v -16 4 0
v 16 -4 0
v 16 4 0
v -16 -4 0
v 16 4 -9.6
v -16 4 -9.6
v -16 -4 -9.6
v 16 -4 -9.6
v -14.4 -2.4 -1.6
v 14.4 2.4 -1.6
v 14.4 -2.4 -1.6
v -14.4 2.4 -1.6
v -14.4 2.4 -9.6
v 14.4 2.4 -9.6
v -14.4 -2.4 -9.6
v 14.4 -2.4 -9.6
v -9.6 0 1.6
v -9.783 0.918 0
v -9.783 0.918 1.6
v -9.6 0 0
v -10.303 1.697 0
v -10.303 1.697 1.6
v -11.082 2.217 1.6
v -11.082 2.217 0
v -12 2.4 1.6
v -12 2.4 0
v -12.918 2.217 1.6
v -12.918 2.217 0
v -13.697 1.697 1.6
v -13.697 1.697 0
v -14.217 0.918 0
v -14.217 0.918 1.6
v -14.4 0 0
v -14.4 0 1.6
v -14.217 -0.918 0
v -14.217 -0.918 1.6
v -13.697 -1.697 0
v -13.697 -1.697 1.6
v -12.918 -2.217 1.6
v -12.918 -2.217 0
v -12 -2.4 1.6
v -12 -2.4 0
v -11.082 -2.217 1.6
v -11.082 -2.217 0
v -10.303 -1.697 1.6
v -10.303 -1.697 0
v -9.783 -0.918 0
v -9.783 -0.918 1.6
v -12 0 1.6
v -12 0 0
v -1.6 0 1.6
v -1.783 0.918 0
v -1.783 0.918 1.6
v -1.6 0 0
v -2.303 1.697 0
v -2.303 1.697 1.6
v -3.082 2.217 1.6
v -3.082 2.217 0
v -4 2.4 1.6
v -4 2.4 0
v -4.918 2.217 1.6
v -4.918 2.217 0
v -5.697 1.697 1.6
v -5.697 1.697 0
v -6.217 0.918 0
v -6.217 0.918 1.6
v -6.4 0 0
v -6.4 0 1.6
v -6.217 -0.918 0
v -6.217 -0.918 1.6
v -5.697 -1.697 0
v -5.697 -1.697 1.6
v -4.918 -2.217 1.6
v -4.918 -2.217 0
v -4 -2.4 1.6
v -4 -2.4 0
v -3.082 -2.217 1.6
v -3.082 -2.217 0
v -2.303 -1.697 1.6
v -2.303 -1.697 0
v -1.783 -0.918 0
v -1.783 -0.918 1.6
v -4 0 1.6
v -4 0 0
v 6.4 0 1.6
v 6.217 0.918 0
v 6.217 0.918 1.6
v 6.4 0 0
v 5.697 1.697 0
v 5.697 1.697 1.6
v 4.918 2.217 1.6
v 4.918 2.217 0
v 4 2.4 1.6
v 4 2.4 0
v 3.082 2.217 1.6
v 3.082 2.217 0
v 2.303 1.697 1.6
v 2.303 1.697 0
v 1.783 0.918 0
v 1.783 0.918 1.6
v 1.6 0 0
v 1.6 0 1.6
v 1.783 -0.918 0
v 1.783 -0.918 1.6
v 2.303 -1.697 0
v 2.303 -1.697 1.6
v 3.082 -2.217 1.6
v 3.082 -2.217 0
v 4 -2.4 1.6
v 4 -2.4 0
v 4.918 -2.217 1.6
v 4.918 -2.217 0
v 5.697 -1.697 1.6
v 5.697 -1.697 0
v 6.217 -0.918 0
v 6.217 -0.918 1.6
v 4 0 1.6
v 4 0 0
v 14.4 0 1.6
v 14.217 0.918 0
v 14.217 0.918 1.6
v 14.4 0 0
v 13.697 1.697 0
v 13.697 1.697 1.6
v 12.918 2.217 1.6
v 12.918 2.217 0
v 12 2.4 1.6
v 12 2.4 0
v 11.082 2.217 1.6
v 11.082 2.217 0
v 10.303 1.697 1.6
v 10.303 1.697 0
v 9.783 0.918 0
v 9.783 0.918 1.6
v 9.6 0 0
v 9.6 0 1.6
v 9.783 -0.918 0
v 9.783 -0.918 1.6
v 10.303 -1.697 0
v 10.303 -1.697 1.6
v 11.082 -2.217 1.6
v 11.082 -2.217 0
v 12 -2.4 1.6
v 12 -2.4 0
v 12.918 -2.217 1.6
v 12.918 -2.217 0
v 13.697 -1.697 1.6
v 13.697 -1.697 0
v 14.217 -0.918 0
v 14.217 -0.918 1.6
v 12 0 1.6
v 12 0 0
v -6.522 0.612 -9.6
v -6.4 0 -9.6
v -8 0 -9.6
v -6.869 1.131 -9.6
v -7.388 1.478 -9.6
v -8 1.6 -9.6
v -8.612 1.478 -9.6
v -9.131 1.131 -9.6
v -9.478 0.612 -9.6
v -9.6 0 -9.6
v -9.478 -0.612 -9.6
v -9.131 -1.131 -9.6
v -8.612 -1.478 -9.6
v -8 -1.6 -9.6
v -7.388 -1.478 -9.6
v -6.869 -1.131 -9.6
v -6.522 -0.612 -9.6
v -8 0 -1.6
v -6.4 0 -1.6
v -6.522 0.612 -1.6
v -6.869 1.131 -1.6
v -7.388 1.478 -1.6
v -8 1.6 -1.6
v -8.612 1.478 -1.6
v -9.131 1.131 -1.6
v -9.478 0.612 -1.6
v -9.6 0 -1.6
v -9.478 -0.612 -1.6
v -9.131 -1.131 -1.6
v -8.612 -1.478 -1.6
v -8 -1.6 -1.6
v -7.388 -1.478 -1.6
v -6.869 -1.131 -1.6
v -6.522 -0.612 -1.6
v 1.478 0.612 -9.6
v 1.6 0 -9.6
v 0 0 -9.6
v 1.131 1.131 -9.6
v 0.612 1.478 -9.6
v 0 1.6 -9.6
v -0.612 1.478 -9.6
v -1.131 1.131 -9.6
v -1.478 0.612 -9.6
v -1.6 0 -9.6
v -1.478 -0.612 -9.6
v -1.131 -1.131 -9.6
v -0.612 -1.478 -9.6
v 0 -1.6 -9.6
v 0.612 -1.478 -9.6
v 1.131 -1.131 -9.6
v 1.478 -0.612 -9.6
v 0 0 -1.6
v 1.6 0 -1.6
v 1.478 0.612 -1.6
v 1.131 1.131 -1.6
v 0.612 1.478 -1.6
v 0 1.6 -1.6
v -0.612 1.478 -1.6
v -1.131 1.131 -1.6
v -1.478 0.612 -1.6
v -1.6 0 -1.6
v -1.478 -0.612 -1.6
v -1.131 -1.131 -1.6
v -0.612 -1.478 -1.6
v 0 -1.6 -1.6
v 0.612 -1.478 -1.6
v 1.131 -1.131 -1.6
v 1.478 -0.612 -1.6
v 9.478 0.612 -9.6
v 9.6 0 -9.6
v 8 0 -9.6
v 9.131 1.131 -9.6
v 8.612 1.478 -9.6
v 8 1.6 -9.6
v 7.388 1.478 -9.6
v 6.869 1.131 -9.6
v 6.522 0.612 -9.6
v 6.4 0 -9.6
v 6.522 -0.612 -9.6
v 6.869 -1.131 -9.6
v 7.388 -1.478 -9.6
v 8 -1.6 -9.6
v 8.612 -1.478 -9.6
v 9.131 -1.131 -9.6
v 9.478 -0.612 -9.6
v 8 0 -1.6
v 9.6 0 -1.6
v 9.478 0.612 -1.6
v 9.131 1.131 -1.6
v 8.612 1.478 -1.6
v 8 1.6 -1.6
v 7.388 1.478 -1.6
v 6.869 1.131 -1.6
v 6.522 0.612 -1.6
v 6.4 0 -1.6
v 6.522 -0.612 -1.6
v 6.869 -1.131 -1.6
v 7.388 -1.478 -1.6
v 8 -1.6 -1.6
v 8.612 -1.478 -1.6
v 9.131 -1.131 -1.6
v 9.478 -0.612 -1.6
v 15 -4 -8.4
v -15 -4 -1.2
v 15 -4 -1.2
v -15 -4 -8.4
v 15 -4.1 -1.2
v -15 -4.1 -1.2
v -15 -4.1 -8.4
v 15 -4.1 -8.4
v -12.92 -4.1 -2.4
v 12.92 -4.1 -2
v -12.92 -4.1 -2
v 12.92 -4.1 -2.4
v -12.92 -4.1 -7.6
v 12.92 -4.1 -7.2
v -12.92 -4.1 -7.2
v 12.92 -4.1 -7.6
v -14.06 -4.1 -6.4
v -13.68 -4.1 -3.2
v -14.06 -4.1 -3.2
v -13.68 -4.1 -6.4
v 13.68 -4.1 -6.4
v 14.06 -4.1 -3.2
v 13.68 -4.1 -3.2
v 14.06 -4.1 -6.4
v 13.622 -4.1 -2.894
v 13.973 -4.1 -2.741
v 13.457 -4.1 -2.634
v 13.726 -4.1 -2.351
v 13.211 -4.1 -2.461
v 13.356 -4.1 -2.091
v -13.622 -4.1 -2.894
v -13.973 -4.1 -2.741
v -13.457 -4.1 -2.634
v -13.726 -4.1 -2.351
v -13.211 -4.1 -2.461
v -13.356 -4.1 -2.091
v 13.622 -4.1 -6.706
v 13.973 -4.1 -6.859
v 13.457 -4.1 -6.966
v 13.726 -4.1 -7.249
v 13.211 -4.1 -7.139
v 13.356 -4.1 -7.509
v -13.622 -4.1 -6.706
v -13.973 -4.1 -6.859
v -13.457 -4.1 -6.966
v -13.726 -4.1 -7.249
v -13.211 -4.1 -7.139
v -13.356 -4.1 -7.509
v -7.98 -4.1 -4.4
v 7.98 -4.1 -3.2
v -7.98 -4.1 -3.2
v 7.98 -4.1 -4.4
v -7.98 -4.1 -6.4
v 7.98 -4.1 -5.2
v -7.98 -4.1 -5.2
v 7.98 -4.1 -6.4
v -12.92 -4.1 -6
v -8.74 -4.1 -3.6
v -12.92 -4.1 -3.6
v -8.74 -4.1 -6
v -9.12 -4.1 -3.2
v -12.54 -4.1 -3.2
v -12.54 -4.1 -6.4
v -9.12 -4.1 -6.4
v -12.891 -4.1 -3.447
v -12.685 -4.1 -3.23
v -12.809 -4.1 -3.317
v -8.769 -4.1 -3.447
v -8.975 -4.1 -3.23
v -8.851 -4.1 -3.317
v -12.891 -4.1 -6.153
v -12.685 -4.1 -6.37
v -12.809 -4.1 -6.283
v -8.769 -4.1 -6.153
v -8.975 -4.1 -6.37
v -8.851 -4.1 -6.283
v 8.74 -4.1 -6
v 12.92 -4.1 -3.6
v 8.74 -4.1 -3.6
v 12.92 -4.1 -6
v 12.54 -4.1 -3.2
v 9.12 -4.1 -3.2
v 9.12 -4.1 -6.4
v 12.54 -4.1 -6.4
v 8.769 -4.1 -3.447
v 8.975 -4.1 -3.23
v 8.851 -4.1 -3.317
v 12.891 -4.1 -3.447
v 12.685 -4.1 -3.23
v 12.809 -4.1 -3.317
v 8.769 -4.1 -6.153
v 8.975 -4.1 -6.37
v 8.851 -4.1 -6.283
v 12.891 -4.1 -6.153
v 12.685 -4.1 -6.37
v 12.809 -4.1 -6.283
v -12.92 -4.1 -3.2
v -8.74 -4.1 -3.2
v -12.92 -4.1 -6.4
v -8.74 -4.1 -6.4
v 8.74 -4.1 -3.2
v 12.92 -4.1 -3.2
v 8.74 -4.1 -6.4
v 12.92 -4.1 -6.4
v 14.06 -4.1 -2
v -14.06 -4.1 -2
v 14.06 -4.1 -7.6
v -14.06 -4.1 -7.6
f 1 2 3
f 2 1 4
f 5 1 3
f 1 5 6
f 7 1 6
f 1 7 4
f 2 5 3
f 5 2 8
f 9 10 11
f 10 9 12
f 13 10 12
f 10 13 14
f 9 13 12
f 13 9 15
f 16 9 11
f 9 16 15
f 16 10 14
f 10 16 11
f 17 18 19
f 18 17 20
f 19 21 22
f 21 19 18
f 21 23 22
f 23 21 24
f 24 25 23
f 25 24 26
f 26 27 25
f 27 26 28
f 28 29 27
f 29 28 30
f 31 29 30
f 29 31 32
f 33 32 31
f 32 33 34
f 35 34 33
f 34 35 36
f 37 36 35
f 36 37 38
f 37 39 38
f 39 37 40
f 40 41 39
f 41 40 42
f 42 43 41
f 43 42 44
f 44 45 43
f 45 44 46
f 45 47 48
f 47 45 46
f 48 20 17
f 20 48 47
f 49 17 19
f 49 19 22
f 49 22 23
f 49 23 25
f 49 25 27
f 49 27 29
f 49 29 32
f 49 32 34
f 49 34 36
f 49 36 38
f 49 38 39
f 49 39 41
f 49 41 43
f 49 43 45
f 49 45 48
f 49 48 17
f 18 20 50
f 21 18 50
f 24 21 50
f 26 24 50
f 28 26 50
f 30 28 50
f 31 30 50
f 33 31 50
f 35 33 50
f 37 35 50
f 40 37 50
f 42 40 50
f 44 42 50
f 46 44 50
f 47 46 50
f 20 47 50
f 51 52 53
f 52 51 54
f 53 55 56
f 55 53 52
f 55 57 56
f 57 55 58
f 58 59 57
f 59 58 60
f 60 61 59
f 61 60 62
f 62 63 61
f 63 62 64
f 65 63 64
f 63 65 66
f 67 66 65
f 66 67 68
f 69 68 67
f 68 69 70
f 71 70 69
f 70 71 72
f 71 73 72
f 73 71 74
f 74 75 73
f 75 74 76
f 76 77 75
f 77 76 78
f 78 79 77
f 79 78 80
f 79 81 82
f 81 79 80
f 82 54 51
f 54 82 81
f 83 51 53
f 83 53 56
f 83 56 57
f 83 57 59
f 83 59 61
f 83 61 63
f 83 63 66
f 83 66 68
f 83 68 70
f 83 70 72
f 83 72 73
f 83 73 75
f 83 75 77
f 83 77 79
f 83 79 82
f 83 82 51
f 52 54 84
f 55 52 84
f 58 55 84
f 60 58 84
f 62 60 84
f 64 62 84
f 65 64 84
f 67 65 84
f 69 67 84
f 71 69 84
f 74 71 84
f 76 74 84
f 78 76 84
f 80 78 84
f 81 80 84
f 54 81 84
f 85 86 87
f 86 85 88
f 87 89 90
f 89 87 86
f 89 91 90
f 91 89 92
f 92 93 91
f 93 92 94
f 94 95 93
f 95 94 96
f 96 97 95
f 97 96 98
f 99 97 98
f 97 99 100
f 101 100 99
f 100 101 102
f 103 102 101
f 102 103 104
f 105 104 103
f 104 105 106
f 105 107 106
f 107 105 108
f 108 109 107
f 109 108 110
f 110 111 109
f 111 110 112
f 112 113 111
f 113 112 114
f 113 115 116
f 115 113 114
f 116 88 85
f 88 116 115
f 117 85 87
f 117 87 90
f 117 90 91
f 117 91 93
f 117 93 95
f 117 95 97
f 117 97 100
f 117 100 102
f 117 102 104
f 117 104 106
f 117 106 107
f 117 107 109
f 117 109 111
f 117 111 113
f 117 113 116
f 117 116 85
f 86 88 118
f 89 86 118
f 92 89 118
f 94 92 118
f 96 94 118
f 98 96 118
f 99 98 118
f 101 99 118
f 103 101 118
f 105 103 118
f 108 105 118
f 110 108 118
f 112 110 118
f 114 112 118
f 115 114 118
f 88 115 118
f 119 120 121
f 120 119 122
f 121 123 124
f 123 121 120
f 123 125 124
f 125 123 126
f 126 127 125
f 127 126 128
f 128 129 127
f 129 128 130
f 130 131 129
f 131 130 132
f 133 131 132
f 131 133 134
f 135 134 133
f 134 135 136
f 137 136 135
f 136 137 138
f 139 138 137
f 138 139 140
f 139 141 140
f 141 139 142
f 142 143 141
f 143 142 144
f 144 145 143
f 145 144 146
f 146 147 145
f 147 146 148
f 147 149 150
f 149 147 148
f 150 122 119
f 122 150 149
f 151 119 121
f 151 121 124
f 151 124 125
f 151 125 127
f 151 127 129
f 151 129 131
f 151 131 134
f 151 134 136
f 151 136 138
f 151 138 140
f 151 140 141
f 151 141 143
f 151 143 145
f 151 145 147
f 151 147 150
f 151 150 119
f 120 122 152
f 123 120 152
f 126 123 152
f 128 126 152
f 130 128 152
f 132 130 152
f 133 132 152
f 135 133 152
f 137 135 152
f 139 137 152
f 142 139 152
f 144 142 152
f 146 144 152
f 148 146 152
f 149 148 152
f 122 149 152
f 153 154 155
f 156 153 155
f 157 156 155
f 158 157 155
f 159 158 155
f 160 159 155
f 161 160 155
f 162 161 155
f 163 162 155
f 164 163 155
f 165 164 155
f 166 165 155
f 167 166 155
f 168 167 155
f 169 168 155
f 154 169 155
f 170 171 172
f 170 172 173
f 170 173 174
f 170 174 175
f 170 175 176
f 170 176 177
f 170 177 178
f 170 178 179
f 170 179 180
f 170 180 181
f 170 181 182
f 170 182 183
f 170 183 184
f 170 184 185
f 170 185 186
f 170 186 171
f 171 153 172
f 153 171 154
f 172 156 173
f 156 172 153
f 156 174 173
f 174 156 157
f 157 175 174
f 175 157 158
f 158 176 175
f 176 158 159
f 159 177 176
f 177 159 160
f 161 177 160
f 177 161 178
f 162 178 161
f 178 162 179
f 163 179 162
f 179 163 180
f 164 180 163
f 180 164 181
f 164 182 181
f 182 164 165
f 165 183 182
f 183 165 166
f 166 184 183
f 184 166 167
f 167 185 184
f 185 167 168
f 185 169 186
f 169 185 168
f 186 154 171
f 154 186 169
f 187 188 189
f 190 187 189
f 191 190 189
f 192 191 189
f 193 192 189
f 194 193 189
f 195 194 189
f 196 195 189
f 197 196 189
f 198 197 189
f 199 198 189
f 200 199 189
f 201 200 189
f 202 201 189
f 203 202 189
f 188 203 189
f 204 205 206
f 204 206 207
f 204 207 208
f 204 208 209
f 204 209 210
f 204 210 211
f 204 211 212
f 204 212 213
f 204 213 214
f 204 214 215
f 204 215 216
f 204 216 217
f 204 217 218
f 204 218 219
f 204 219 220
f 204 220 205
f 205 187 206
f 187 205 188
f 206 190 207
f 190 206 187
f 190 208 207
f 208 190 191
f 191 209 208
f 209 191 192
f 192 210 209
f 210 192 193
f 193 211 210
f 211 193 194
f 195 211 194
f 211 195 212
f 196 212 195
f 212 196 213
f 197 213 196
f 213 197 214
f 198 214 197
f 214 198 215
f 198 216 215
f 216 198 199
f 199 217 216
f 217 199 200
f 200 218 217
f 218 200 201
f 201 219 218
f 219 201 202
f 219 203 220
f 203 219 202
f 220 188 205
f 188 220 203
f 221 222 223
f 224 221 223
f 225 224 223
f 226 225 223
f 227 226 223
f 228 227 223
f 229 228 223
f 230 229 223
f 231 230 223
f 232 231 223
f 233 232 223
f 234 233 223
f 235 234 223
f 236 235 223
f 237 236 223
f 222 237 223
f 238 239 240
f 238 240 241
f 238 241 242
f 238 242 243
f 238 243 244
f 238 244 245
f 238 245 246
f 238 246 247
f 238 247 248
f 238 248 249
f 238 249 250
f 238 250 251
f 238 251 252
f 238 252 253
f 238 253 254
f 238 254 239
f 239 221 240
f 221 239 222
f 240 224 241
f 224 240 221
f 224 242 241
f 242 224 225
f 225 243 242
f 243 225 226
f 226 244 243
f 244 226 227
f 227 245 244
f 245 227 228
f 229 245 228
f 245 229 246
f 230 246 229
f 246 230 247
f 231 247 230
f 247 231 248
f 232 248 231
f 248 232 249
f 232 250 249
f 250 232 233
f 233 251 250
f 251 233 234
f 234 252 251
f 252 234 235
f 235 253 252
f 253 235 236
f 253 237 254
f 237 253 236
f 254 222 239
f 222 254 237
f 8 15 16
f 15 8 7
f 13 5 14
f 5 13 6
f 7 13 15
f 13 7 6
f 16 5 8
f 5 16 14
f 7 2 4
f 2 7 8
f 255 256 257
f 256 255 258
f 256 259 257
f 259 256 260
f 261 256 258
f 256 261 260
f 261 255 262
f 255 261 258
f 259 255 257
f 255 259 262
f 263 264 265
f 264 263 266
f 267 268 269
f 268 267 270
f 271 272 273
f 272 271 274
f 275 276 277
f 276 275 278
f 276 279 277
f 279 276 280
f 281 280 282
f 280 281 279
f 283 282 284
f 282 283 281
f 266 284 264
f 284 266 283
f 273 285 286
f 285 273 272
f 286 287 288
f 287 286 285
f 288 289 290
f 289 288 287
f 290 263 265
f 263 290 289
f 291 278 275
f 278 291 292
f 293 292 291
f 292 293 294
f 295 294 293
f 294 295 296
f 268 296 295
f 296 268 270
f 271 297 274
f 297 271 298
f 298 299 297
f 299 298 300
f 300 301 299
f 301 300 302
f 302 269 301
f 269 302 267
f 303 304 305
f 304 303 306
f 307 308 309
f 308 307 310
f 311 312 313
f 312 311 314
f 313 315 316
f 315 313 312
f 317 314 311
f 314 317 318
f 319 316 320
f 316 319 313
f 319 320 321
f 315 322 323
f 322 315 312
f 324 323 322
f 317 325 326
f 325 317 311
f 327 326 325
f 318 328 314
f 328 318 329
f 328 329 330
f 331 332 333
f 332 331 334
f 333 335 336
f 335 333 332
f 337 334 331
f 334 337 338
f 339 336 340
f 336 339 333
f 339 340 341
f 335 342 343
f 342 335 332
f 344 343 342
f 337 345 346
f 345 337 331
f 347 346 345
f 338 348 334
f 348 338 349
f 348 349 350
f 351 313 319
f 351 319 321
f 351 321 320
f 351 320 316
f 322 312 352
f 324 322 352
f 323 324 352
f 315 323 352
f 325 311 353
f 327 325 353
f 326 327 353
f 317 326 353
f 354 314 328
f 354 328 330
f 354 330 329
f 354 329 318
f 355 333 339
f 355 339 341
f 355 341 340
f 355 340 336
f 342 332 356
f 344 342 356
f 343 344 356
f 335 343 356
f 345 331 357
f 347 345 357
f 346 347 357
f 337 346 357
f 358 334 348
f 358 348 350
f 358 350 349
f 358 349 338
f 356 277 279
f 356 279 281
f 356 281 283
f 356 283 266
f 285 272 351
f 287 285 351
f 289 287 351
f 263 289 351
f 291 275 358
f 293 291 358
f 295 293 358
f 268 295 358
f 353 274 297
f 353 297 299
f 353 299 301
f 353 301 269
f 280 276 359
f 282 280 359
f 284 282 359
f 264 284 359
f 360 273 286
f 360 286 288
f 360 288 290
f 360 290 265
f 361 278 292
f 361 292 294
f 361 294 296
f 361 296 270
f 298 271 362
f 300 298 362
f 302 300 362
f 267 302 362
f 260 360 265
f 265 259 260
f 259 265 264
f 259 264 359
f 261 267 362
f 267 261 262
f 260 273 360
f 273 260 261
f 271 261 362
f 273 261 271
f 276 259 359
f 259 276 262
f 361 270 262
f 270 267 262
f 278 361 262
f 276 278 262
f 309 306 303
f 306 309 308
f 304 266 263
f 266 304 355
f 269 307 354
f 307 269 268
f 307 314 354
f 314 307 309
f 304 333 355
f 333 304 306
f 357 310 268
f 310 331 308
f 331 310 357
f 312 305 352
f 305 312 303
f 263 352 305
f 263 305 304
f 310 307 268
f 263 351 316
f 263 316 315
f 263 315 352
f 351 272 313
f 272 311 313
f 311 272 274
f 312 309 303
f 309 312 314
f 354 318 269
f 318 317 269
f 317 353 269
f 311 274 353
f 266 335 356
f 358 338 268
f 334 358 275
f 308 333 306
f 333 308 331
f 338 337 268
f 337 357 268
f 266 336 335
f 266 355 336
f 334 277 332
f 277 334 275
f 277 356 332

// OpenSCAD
use <../lib.scad>
use <190435c.scad>
use <3010.scad>
function ldraw_lib__3010d09() = [
// 0 Brick  1 x  4 with Black Car Front on Yellow Background Sticker
// 0 Name: 3010d09.dat
// 0 Author: Takeshi Takahashi [RainbowDolphin]
// 0 !LDRAW_ORG Shortcut UPDATE 2024-05
// 0 !LICENSE Licensed under CC BY 4.0 : see CAreadme.txt
// 
// 0 BFC CERTIFY CCW
  [0,"BFC","CERTIFY"],
  [0,"BFC","CCW"],
// 
// 0 !CATEGORY Sticker Shortcut
// 0 !KEYWORDS Auto service truck, Bricklink 3010pb036st, Set 646-1
// 
// 0 !HISTORY 2024-06-30 [OrionP] Official Update 2024-05
// 
// 1 16 0 0 0 1 0 0 0 1 0 0 0 1 3010.dat
  [1,16,0,0,0,1,0,0,0,1,0,0,0,1, ldraw_lib__3010()],
// 1 16 0 12 -10 1 0 0 0 0 -1 0 1 0 190435c.dat
  [1,16,0,12,-10,1,0,0,0,0,-1,0,1,0, ldraw_lib__190435c()],
];
module ldraw_lib__3010d09(step=0, col=false, unit=2/5, alt=false, line=0.2, solid=!$preview)
    makepoly(ldraw_lib__3010d09(), step=step, col=col, unit=unit, alt=alt, line=line, solid=solid);
ldraw_lib__3010d09(line=0.2);
